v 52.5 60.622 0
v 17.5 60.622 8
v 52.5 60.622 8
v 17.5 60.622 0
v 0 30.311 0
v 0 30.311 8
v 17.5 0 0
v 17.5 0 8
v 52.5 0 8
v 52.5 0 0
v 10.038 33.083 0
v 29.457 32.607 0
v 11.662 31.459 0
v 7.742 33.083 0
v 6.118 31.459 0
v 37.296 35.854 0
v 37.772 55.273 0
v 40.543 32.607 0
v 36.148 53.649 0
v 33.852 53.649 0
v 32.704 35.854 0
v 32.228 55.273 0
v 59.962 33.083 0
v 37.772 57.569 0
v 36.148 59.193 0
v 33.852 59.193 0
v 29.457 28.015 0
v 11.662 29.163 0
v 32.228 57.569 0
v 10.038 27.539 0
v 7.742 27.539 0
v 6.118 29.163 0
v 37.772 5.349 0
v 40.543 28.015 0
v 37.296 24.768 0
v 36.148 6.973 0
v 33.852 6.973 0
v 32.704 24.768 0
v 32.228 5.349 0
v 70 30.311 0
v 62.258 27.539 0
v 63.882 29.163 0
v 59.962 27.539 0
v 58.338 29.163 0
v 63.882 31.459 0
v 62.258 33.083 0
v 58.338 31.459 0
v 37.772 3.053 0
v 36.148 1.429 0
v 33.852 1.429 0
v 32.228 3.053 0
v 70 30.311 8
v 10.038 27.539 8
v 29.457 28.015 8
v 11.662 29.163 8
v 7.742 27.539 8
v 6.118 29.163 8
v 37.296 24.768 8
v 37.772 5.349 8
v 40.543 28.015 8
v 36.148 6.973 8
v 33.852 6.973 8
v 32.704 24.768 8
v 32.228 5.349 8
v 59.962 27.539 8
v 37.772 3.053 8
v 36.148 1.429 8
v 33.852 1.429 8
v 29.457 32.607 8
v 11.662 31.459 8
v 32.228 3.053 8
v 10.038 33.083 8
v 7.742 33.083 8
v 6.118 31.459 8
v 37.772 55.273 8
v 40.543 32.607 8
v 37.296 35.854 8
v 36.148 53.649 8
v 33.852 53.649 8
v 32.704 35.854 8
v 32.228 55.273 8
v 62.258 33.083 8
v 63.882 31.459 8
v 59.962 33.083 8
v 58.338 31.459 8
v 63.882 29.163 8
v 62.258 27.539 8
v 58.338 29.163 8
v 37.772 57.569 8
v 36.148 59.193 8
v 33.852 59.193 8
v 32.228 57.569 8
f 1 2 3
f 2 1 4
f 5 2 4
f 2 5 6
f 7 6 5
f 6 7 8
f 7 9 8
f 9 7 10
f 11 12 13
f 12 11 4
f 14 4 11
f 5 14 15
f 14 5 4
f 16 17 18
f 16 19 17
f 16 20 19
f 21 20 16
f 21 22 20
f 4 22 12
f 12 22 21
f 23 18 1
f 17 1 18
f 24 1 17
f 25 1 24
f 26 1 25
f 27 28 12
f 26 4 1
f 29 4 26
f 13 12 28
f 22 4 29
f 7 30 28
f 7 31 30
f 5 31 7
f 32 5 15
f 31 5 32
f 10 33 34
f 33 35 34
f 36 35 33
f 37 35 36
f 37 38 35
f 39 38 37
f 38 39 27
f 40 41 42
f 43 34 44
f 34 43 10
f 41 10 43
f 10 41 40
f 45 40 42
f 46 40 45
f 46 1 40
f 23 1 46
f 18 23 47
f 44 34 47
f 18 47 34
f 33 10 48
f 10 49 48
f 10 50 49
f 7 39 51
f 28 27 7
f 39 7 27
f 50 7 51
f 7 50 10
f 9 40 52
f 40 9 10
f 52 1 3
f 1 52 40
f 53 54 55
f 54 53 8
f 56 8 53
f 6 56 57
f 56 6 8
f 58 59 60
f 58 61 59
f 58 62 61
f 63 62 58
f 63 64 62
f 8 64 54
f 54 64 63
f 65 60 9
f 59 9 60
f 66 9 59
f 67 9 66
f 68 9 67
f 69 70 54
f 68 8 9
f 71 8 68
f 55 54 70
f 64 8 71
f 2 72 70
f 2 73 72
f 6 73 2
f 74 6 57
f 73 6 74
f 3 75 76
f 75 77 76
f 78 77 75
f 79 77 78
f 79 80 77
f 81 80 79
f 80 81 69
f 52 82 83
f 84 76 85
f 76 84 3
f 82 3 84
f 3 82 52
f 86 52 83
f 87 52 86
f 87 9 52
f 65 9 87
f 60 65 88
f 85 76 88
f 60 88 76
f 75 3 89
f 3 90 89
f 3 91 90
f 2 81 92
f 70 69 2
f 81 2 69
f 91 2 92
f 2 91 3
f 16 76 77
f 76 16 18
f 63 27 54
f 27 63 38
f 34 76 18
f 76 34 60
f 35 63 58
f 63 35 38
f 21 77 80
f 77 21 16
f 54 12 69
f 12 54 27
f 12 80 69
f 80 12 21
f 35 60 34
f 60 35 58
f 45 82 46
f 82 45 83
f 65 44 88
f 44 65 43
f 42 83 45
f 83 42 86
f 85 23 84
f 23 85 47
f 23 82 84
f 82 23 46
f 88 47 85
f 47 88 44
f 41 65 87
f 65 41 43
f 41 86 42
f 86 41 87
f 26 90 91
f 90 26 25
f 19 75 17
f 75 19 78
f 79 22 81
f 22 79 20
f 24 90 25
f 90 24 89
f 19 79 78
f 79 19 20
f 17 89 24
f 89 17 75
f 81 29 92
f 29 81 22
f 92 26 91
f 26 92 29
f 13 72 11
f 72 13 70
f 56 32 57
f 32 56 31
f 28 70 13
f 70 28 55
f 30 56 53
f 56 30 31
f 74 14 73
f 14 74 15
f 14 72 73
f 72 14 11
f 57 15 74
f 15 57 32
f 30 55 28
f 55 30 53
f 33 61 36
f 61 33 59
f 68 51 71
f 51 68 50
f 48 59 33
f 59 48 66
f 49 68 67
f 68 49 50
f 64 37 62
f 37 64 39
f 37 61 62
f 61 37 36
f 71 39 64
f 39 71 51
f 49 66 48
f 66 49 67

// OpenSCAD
$fn = 32;

// ----------------------------------------------------------------------
// Polygon plate: 6-gon R35, 4 bolt windows
// ----------------------------------------------------------------------

// --- parameters (mm) ---
sides = 6;                // number of polygon sides
plate_r = 35;             // circumscribed radius of the polygon
bore_r = 6;               // centre bore radius
bolts = 4;                // number of bolt windows
ring_r = 26.11;           // bolt-circle radius
bolt_r = 3;               // bolt window radius
plate_t = 8;              // plate thickness, Z (extrusion height)

plate_d = 2 * plate_r;  // circumscribed diameter
bore_d = 2 * bore_r;  // centre bore diameter
bolt_d = 2 * bolt_r;  // bolt window diameter
ring_d = 2 * ring_r;  // bolt-circle diameter

profile = [[70, 30.311], [52.5, 60.622], [17.5, 60.622], [0, 30.311], [17.5, 0], [52.5, 0]];  // primary outline, 6 points, counter clockwise
void_1 = [[40.543, 32.607], [37.296, 35.854], [32.704, 35.854], [29.457, 32.607], [29.457, 28.015], [32.704, 24.768], [37.296, 24.768], [40.543, 28.015]];  // centre bore, 8 points
void_2 = [[63.882, 31.459], [62.258, 33.083], [59.962, 33.083], [58.338, 31.459], [58.338, 29.163], [59.962, 27.539], [62.258, 27.539], [63.882, 29.163]];  // bolt window 1, 8 points
void_3 = [[37.772, 57.569], [36.148, 59.193], [33.852, 59.193], [32.228, 57.569], [32.228, 55.273], [33.852, 53.649], [36.148, 53.649], [37.772, 55.273]];  // bolt window 2, 8 points
void_4 = [[11.662, 31.459], [10.038, 33.083], [7.742, 33.083], [6.118, 31.459], [6.118, 29.163], [7.742, 27.539], [10.038, 27.539], [11.662, 29.163]];  // bolt window 3, 8 points
void_5 = [[37.772, 5.349], [36.148, 6.973], [33.852, 6.973], [32.228, 5.349], [32.228, 3.053], [33.852, 1.429], [36.148, 1.429], [37.772, 3.053]];  // bolt window 4, 8 points

// --- the one profile operation ---
difference() {
  linear_extrude(height = plate_t) polygon(points = profile);
  translate([0, 0, -1])
    linear_extrude(height = plate_t + 2) polygon(points = void_1);
  translate([0, 0, -1])
    linear_extrude(height = plate_t + 2) polygon(points = void_2);
  translate([0, 0, -1])
    linear_extrude(height = plate_t + 2) polygon(points = void_3);
  translate([0, 0, -1])
    linear_extrude(height = plate_t + 2) polygon(points = void_4);
  translate([0, 0, -1])
    linear_extrude(height = plate_t + 2) polygon(points = void_5);
}
